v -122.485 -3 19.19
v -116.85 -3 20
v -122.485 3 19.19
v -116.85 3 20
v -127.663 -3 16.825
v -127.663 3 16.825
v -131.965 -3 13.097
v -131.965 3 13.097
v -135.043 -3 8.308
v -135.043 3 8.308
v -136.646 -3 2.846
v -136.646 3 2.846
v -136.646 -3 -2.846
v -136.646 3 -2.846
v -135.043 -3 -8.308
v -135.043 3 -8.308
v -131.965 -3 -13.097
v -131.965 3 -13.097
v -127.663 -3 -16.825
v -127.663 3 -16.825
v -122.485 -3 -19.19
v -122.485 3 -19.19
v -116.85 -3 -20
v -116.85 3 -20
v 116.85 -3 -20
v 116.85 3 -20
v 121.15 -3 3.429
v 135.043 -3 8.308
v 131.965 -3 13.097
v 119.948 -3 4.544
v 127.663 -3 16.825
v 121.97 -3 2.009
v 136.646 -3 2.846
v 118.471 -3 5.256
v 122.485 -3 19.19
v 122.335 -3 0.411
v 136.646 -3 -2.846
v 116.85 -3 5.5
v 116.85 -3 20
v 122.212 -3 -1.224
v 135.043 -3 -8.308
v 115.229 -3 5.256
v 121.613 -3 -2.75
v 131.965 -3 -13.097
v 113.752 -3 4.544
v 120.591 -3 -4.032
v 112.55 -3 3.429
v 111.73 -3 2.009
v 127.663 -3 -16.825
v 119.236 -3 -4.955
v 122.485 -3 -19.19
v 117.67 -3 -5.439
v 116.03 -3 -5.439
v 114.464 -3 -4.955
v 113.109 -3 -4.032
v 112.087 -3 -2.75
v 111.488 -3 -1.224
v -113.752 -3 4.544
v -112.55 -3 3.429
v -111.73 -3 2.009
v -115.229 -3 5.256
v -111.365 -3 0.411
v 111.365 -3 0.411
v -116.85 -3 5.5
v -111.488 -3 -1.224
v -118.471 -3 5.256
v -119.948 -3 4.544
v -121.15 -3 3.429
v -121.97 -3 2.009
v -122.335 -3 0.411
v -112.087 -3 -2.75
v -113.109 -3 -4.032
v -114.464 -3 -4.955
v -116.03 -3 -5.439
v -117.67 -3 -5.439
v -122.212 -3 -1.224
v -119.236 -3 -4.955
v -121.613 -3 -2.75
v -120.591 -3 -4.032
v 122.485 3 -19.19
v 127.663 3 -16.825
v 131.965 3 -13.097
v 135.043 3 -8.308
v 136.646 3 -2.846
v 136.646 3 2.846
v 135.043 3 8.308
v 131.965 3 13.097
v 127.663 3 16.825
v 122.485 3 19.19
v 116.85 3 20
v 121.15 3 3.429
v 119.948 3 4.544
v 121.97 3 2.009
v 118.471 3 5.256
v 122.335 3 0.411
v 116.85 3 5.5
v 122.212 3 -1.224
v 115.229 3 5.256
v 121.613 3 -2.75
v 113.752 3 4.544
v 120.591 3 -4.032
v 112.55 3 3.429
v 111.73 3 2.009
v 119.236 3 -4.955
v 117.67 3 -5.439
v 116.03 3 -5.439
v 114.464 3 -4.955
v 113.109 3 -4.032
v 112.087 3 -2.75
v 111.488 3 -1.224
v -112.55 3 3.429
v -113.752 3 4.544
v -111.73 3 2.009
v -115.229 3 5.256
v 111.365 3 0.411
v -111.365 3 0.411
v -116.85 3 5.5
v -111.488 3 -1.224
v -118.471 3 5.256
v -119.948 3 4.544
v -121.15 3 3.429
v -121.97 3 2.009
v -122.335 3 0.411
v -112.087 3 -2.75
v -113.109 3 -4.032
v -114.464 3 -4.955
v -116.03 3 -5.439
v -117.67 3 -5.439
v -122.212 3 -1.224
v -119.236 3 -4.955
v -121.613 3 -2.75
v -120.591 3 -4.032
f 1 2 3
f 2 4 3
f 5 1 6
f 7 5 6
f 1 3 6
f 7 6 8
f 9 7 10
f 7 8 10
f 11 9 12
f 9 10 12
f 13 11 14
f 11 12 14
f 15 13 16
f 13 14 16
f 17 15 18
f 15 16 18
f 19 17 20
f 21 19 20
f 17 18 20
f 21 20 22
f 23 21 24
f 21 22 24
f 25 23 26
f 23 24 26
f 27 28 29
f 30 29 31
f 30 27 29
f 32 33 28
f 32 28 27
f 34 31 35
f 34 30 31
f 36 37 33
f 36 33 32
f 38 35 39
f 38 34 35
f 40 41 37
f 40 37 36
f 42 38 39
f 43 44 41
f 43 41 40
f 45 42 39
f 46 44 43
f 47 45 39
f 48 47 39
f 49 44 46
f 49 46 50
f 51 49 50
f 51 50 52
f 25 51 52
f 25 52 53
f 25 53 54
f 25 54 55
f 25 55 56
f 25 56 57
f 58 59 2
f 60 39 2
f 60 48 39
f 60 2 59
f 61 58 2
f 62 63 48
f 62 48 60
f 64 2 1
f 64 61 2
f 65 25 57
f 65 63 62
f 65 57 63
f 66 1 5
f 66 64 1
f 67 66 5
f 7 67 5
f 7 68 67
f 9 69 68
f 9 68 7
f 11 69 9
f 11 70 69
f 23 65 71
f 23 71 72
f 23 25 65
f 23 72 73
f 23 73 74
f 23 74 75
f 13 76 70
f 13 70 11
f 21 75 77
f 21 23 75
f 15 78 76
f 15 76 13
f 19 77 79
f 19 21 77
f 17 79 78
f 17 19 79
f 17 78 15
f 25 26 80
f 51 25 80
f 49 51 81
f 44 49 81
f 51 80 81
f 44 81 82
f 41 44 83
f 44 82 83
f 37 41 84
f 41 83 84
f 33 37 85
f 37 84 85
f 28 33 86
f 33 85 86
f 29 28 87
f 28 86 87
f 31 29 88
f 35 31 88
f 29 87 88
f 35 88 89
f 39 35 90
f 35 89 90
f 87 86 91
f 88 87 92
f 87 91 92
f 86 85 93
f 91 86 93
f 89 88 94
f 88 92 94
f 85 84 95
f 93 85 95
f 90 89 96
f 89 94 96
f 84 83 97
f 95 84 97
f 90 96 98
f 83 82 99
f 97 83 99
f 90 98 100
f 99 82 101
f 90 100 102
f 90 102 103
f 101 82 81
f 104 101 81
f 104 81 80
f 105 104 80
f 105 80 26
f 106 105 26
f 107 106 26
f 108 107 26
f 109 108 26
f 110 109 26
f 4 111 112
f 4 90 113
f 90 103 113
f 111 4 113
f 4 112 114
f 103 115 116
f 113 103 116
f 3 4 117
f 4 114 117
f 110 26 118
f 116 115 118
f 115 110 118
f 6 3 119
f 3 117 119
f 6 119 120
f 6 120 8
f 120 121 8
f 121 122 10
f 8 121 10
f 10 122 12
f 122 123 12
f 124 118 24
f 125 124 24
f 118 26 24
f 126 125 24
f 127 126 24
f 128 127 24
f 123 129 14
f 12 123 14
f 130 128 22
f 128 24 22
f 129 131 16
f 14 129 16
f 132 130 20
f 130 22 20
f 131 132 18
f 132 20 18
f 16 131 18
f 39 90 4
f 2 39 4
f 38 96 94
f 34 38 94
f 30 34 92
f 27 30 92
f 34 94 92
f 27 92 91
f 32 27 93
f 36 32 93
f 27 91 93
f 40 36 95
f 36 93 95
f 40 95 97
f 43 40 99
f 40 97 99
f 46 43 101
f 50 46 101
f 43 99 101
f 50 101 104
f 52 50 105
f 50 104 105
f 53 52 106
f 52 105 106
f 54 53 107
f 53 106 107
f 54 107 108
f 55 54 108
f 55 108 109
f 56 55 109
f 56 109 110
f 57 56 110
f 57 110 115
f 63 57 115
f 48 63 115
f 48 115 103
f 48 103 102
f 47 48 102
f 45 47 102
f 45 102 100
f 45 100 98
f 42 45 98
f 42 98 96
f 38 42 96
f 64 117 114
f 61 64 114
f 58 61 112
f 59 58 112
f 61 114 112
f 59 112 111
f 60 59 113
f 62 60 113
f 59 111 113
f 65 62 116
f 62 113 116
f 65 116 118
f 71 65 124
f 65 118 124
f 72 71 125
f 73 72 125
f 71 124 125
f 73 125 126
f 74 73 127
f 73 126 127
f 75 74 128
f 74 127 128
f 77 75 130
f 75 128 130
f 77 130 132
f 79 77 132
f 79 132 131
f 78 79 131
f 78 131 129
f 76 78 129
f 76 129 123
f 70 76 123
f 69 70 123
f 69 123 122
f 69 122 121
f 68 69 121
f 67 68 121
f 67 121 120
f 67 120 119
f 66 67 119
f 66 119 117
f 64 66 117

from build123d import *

# Parameters (mm, degrees)
EXTRUDE_1_DEPTH     = 3
SKETCH_2_R          = 5.5
CUT_EXTRUDE_1_DEPTH = 9


with BuildPart() as part:
    # 草图1 → 凸台-拉伸1 (new, symmetric)
    with BuildSketch(Plane(origin=(0, 0, 0), x_dir=(1, 0, 0), z_dir=(0, 1, 0))):
        with BuildLine():
            Line((116.85, -20), (-116.85, -20))
            ThreePointArc((-116.85, -20), (-136.85, 0), (-116.85, 20))
            Line((-116.85, 20), (116.85, 20))
            ThreePointArc((116.85, 20), (136.85, 0), (116.85, -20))
        make_face()
    extrude(amount=EXTRUDE_1_DEPTH, both=True)

    # 草图2 → 切除-拉伸1 (cut)
    with BuildSketch(Plane(origin=(0, 3, 0), x_dir=(1, 0, 0), z_dir=(0, 1, 0))):
        with Locations(Location((-116.85, 0, 0), (0, 0, 270))):
            Circle(SKETCH_2_R)
        with Locations(Location((116.85, 0, 0), (0, 0, 270))):
            Circle(SKETCH_2_R)
    extrude(amount=-CUT_EXTRUDE_1_DEPTH, mode=Mode.SUBTRACT)


solid = part.part
